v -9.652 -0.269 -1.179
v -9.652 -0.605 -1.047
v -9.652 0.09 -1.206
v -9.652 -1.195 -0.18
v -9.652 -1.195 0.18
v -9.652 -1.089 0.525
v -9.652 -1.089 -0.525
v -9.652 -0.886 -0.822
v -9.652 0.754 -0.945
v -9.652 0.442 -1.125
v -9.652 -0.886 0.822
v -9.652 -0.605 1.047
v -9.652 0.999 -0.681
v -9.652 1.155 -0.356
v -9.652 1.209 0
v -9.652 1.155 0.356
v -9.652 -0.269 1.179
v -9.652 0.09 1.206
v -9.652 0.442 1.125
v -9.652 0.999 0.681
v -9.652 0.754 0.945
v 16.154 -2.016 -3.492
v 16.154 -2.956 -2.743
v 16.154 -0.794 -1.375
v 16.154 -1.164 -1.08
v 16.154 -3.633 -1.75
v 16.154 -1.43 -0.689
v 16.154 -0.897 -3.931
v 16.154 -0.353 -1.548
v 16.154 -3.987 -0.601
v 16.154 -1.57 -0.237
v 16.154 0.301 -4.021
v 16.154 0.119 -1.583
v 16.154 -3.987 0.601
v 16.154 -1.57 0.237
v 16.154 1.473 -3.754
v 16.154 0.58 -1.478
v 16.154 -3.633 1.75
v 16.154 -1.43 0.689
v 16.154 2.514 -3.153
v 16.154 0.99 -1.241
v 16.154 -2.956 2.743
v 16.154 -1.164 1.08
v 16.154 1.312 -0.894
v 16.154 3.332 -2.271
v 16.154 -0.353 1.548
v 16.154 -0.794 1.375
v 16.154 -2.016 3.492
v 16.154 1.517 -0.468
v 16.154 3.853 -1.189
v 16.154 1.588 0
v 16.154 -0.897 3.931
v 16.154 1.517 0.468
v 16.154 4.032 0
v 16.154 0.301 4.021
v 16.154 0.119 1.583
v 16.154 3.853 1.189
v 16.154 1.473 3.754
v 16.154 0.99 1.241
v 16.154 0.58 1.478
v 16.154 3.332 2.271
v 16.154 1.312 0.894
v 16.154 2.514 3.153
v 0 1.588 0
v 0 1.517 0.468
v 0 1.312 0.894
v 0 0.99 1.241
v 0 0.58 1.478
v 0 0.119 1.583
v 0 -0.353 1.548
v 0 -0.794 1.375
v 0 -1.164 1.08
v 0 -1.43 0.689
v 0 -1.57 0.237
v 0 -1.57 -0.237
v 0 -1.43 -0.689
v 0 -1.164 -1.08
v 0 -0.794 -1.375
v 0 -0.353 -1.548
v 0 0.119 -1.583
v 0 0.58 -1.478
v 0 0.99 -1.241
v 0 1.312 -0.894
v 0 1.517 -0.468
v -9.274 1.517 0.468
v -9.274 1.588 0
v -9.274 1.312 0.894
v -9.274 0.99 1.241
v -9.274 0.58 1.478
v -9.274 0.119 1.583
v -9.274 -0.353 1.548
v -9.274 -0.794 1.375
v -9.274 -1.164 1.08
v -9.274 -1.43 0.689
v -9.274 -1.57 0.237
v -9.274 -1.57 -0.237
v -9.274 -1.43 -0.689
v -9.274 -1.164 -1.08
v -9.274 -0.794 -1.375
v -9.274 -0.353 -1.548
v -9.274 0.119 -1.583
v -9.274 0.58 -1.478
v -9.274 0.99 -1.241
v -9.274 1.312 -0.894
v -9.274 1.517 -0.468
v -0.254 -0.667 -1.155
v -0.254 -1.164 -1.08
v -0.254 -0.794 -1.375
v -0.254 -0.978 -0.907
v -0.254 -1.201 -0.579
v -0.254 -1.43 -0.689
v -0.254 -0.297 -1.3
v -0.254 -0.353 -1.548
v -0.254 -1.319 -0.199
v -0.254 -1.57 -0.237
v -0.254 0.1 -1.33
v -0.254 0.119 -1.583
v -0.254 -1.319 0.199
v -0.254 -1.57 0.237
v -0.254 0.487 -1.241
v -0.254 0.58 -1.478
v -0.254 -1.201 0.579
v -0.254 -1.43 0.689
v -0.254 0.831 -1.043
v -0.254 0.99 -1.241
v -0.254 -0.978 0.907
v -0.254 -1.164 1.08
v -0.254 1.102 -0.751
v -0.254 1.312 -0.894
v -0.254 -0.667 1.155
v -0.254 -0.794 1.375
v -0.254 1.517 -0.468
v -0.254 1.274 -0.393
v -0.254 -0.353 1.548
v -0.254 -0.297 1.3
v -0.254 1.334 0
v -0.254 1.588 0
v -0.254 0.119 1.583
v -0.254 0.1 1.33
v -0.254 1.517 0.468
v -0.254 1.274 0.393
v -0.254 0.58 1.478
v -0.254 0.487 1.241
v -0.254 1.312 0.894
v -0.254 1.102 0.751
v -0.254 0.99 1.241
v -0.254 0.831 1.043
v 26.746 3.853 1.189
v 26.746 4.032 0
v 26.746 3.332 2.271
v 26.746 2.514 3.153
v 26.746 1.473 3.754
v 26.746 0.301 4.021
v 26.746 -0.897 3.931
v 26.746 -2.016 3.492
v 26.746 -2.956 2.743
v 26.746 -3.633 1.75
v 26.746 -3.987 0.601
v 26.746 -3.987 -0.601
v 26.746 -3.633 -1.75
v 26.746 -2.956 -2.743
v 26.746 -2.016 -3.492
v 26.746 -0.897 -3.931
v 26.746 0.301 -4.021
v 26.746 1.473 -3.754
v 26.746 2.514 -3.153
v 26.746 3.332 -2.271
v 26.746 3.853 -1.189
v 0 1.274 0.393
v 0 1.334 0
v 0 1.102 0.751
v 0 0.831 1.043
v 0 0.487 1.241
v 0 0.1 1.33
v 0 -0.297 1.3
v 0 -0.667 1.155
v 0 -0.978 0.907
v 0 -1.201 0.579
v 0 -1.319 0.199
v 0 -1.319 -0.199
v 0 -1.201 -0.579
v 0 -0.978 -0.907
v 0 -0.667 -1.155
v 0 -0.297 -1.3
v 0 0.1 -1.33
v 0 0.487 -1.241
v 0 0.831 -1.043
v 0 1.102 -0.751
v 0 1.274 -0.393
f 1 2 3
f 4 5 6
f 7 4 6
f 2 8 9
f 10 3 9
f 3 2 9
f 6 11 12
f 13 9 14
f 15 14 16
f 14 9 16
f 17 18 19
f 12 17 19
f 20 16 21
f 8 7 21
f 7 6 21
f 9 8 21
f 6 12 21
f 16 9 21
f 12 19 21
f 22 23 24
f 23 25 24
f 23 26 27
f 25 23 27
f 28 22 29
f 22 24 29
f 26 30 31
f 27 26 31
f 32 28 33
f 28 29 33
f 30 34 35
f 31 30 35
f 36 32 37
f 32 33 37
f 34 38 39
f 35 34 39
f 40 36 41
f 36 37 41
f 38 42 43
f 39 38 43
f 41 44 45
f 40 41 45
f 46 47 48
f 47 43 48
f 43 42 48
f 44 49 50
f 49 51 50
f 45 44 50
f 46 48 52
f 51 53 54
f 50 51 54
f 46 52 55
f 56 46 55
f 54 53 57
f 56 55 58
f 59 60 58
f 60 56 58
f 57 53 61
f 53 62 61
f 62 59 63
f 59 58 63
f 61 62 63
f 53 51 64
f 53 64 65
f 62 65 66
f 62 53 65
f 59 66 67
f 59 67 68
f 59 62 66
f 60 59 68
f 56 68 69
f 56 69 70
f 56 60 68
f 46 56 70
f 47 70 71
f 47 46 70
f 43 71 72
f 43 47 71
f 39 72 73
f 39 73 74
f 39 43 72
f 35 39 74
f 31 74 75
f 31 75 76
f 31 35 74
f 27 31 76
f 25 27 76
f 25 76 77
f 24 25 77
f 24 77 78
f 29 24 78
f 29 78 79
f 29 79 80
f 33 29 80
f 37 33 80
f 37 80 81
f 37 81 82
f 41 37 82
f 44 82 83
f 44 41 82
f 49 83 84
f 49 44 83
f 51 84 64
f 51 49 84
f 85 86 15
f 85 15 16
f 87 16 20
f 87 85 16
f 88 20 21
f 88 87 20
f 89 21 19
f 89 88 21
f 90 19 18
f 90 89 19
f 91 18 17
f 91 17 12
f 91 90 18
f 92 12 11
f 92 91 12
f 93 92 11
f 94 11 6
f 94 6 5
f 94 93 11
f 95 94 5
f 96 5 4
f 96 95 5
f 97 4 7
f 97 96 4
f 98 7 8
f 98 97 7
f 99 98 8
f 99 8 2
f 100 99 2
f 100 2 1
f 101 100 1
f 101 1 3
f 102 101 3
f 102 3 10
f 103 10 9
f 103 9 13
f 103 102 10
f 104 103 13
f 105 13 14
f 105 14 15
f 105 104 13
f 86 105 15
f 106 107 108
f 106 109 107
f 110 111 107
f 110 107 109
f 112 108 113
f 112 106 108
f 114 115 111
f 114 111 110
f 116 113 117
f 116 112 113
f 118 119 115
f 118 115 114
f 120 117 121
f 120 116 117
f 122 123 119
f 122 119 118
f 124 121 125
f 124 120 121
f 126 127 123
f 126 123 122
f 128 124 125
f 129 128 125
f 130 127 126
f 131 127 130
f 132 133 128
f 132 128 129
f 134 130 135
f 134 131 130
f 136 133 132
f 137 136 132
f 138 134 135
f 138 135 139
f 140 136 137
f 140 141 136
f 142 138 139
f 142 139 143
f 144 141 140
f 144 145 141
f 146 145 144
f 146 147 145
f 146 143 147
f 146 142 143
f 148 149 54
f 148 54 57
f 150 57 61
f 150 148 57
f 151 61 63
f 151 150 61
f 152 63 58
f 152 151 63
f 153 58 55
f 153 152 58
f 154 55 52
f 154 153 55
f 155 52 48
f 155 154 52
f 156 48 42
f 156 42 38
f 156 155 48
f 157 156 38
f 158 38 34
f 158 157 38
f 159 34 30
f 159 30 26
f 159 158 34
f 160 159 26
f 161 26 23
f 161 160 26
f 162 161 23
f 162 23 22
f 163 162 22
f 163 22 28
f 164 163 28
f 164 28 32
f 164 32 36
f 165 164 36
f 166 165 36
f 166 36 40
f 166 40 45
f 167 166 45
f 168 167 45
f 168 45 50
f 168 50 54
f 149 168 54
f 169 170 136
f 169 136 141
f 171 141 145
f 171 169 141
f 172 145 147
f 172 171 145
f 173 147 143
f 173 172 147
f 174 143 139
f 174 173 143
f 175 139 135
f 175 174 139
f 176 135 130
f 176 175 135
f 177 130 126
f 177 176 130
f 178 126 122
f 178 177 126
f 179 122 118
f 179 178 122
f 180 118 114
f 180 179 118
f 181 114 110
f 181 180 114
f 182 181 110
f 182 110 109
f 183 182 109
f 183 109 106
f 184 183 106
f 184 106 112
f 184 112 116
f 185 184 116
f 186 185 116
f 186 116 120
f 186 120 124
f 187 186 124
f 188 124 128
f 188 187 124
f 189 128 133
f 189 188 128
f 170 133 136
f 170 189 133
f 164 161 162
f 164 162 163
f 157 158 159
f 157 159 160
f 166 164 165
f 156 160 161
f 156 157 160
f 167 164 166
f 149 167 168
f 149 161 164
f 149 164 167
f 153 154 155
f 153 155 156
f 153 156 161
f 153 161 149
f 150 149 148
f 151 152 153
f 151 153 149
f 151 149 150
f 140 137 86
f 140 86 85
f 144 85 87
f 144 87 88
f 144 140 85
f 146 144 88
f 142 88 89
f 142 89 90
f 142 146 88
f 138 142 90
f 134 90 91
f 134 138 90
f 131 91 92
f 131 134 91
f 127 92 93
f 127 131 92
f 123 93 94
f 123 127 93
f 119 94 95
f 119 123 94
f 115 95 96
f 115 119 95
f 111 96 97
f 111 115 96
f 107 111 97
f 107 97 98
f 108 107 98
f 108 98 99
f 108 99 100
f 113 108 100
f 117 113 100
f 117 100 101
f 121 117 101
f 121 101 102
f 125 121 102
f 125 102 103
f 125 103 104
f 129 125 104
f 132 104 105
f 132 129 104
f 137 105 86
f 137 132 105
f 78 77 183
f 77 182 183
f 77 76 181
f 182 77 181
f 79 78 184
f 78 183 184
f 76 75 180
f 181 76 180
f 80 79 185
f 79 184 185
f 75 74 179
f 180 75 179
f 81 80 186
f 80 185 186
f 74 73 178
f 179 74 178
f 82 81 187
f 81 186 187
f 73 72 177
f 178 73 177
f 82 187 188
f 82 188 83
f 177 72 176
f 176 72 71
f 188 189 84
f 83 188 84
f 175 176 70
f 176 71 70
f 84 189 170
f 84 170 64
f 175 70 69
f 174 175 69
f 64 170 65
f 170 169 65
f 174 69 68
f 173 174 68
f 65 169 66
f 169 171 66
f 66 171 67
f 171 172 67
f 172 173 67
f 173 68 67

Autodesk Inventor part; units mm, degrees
sketch "Sketch_1" plane through (0, 0, 0) normal (0, 0, 1) x (1, 0, 0)
  line L0 (26.7462, 0) -> (0, 0)
  line L1 (0, 0) -> (0, 1.5875)
  line L2 (0, 1.5875) -> (16.1544, 1.5875)
  line L3 (16.1544, 1.5875) -> (16.1544, 4.0323)
  line L4 (16.1544, 4.0323) -> (26.7462, 4.0323)
  line L5 (26.7462, 4.0323) -> (26.7462, 0)
  line L6 (26.7462, 0) -> (0, 0)
revolve "Revolution1" add sketch "Sketch_1" angle 360 about axis through (26.7462, 0, 0) along (1, 0, 0)
sketch "Sketch_2" plane through (0, 0, 0) normal (0, 0, 1) x (1, 0, 0)
  line L0 (0, 0) -> (-9.652, 0)
  line L1 (-9.652, 0) -> (-9.652, 1.209)
  line L2 (-9.652, 1.209) -> (-9.2735, 1.5875)
  line L3 (-9.2735, 1.5875) -> (0, 1.5875)
  line L4 (0, 1.5875) -> (0, 0)
  line L5 (0, 0) -> (-9.652, 0)
revolve "Revolution2" add sketch "Sketch_2" angle 360 about axis through (0, 0, 0) along (1, 0, 0)
thread "Thread1" size "5-40 UNC" class "2A" standard "ANSI Unified Screw Threads" length 9.2735
sketch "Sketch_30" plane through (0, 0, 0) normal (0, 0, 1) x (1, 0, 0)
  line L0 (0, 0) -> (-0.254, 0)
  line L1 (-0.254, 1.3335) -> (0, 1.3335)
  line L2 (0, 1.3335) -> (0, 1.8415)
  line L3 (0, 1.8415) -> (-0.254, 1.8415)
  line L4 (-0.254, 1.8415) -> (-0.254, 1.3335)
revolve "Revolution3" cut sketch "Sketch_30" angle 360 about axis through (0, 0, 0) along (1, 0, 0)
ref_plane "dia1_XY" through (0, 1.5875, 0) normal (1, 0, 0) x (0, 0, -1)
ref_plane "dia1_YZ" through (0, 1.5875, 0) normal (0, 0, -1) x (0, 1, 0)
ref_plane "dia1_ZX" through (0, 1.5875, 0) normal (0, 1, 0) x (1, 0, 0)
ref_plane "dia12_XY" through (0, 0, 4.5593) normal (1, 0, 0) x (0, 0, -1)
ref_plane "dia12_YZ" through (0, 0, 4.5593) normal (0, 0, -1) x (0, 1, 0)
ref_plane "dia12_ZX" through (0, 0, 4.5593) normal (0, 1, 0) x (1, 0, 0)
ref_plane "dia2_XY" through (0, -1.5875, 0) normal (1, 0, 0) x (0, 0, -1)
ref_plane "dia2_YZ" through (0, -1.5875, 0) normal (0, 0, -1) x (0, 1, 0)
ref_plane "dia2_ZX" through (0, -1.5875, 0) normal (0, 1, 0) x (1, 0, 0)
ref_plane "dia22_XY" through (0, 0, -4.5593) normal (1, 0, 0) x (0, 0, -1)
ref_plane "dia22_YZ" through (0, 0, -4.5593) normal (0, 0, -1) x (0, 1, 0)
ref_plane "dia22_ZX" through (0, 0, -4.5593) normal (0, 1, 0) x (1, 0, 0)
ref_plane "rl1_XY" through (-9.652, 0, 0) normal (1, 0, 0) x (0, 0, -1)
ref_plane "rl1_YZ" through (-9.652, 0, 0) normal (0, 0, -1) x (0, 1, 0)
ref_plane "rl1_ZX" through (-9.652, 0, 0) normal (0, 1, 0) x (1, 0, 0)
ref_plane "rl2_XY" through (0, 0, 0) normal (1, 0, 0) x (0, 0, -1)
ref_plane "rl2_YZ" through (0, 0, 0) normal (0, 0, -1) x (0, 1, 0)
ref_plane "rl2_ZX" through (0, 0, 0) normal (0, 1, 0) x (1, 0, 0)
ref_plane "rod_cp_XY" through (0, 0, 0) normal (1, 0, 0) x (0, 0, -1)
ref_plane "rod_cp_YZ" through (0, 0, 0) normal (0, 0, -1) x (0, 1, 0)
ref_plane "rod_cp_ZX" through (0, 0, 0) normal (0, 1, 0) x (1, 0, 0)
ref_plane "thd1_XY" through (-9.652, 1.5875, 0) normal (1, 0, 0) x (0, 0, -1)
ref_plane "thd1_YZ" through (-9.652, 1.5875, 0) normal (0, 0, -1) x (0, 1, 0)
ref_plane "thd1_ZX" through (-9.652, 1.5875, 0) normal (0, 1, 0) x (1, 0, 0)
ref_plane "thd2_XY" through (-9.652, -1.5875, 0) normal (1, 0, 0) x (0, 0, -1)
ref_plane "thd2_YZ" through (-9.652, -1.5875, 0) normal (0, 0, -1) x (0, 1, 0)
ref_plane "thd2_ZX" through (-9.652, -1.5875, 0) normal (0, 1, 0) x (1, 0, 0)
ref_plane "to_rod_clevis_XY" through (-9.652, 0, 0) normal (1, 0, 0) x (0, 0, -1)
ref_plane "to_rod_clevis_YZ" through (-9.652, 0, 0) normal (0, 0, -1) x (0, 1, 0)
ref_plane "to_rod_clevis_ZX" through (-9.652, 0, 0) normal (0, 1, 0) x (1, 0, 0)
properties part number "0070.0110000_rod"
